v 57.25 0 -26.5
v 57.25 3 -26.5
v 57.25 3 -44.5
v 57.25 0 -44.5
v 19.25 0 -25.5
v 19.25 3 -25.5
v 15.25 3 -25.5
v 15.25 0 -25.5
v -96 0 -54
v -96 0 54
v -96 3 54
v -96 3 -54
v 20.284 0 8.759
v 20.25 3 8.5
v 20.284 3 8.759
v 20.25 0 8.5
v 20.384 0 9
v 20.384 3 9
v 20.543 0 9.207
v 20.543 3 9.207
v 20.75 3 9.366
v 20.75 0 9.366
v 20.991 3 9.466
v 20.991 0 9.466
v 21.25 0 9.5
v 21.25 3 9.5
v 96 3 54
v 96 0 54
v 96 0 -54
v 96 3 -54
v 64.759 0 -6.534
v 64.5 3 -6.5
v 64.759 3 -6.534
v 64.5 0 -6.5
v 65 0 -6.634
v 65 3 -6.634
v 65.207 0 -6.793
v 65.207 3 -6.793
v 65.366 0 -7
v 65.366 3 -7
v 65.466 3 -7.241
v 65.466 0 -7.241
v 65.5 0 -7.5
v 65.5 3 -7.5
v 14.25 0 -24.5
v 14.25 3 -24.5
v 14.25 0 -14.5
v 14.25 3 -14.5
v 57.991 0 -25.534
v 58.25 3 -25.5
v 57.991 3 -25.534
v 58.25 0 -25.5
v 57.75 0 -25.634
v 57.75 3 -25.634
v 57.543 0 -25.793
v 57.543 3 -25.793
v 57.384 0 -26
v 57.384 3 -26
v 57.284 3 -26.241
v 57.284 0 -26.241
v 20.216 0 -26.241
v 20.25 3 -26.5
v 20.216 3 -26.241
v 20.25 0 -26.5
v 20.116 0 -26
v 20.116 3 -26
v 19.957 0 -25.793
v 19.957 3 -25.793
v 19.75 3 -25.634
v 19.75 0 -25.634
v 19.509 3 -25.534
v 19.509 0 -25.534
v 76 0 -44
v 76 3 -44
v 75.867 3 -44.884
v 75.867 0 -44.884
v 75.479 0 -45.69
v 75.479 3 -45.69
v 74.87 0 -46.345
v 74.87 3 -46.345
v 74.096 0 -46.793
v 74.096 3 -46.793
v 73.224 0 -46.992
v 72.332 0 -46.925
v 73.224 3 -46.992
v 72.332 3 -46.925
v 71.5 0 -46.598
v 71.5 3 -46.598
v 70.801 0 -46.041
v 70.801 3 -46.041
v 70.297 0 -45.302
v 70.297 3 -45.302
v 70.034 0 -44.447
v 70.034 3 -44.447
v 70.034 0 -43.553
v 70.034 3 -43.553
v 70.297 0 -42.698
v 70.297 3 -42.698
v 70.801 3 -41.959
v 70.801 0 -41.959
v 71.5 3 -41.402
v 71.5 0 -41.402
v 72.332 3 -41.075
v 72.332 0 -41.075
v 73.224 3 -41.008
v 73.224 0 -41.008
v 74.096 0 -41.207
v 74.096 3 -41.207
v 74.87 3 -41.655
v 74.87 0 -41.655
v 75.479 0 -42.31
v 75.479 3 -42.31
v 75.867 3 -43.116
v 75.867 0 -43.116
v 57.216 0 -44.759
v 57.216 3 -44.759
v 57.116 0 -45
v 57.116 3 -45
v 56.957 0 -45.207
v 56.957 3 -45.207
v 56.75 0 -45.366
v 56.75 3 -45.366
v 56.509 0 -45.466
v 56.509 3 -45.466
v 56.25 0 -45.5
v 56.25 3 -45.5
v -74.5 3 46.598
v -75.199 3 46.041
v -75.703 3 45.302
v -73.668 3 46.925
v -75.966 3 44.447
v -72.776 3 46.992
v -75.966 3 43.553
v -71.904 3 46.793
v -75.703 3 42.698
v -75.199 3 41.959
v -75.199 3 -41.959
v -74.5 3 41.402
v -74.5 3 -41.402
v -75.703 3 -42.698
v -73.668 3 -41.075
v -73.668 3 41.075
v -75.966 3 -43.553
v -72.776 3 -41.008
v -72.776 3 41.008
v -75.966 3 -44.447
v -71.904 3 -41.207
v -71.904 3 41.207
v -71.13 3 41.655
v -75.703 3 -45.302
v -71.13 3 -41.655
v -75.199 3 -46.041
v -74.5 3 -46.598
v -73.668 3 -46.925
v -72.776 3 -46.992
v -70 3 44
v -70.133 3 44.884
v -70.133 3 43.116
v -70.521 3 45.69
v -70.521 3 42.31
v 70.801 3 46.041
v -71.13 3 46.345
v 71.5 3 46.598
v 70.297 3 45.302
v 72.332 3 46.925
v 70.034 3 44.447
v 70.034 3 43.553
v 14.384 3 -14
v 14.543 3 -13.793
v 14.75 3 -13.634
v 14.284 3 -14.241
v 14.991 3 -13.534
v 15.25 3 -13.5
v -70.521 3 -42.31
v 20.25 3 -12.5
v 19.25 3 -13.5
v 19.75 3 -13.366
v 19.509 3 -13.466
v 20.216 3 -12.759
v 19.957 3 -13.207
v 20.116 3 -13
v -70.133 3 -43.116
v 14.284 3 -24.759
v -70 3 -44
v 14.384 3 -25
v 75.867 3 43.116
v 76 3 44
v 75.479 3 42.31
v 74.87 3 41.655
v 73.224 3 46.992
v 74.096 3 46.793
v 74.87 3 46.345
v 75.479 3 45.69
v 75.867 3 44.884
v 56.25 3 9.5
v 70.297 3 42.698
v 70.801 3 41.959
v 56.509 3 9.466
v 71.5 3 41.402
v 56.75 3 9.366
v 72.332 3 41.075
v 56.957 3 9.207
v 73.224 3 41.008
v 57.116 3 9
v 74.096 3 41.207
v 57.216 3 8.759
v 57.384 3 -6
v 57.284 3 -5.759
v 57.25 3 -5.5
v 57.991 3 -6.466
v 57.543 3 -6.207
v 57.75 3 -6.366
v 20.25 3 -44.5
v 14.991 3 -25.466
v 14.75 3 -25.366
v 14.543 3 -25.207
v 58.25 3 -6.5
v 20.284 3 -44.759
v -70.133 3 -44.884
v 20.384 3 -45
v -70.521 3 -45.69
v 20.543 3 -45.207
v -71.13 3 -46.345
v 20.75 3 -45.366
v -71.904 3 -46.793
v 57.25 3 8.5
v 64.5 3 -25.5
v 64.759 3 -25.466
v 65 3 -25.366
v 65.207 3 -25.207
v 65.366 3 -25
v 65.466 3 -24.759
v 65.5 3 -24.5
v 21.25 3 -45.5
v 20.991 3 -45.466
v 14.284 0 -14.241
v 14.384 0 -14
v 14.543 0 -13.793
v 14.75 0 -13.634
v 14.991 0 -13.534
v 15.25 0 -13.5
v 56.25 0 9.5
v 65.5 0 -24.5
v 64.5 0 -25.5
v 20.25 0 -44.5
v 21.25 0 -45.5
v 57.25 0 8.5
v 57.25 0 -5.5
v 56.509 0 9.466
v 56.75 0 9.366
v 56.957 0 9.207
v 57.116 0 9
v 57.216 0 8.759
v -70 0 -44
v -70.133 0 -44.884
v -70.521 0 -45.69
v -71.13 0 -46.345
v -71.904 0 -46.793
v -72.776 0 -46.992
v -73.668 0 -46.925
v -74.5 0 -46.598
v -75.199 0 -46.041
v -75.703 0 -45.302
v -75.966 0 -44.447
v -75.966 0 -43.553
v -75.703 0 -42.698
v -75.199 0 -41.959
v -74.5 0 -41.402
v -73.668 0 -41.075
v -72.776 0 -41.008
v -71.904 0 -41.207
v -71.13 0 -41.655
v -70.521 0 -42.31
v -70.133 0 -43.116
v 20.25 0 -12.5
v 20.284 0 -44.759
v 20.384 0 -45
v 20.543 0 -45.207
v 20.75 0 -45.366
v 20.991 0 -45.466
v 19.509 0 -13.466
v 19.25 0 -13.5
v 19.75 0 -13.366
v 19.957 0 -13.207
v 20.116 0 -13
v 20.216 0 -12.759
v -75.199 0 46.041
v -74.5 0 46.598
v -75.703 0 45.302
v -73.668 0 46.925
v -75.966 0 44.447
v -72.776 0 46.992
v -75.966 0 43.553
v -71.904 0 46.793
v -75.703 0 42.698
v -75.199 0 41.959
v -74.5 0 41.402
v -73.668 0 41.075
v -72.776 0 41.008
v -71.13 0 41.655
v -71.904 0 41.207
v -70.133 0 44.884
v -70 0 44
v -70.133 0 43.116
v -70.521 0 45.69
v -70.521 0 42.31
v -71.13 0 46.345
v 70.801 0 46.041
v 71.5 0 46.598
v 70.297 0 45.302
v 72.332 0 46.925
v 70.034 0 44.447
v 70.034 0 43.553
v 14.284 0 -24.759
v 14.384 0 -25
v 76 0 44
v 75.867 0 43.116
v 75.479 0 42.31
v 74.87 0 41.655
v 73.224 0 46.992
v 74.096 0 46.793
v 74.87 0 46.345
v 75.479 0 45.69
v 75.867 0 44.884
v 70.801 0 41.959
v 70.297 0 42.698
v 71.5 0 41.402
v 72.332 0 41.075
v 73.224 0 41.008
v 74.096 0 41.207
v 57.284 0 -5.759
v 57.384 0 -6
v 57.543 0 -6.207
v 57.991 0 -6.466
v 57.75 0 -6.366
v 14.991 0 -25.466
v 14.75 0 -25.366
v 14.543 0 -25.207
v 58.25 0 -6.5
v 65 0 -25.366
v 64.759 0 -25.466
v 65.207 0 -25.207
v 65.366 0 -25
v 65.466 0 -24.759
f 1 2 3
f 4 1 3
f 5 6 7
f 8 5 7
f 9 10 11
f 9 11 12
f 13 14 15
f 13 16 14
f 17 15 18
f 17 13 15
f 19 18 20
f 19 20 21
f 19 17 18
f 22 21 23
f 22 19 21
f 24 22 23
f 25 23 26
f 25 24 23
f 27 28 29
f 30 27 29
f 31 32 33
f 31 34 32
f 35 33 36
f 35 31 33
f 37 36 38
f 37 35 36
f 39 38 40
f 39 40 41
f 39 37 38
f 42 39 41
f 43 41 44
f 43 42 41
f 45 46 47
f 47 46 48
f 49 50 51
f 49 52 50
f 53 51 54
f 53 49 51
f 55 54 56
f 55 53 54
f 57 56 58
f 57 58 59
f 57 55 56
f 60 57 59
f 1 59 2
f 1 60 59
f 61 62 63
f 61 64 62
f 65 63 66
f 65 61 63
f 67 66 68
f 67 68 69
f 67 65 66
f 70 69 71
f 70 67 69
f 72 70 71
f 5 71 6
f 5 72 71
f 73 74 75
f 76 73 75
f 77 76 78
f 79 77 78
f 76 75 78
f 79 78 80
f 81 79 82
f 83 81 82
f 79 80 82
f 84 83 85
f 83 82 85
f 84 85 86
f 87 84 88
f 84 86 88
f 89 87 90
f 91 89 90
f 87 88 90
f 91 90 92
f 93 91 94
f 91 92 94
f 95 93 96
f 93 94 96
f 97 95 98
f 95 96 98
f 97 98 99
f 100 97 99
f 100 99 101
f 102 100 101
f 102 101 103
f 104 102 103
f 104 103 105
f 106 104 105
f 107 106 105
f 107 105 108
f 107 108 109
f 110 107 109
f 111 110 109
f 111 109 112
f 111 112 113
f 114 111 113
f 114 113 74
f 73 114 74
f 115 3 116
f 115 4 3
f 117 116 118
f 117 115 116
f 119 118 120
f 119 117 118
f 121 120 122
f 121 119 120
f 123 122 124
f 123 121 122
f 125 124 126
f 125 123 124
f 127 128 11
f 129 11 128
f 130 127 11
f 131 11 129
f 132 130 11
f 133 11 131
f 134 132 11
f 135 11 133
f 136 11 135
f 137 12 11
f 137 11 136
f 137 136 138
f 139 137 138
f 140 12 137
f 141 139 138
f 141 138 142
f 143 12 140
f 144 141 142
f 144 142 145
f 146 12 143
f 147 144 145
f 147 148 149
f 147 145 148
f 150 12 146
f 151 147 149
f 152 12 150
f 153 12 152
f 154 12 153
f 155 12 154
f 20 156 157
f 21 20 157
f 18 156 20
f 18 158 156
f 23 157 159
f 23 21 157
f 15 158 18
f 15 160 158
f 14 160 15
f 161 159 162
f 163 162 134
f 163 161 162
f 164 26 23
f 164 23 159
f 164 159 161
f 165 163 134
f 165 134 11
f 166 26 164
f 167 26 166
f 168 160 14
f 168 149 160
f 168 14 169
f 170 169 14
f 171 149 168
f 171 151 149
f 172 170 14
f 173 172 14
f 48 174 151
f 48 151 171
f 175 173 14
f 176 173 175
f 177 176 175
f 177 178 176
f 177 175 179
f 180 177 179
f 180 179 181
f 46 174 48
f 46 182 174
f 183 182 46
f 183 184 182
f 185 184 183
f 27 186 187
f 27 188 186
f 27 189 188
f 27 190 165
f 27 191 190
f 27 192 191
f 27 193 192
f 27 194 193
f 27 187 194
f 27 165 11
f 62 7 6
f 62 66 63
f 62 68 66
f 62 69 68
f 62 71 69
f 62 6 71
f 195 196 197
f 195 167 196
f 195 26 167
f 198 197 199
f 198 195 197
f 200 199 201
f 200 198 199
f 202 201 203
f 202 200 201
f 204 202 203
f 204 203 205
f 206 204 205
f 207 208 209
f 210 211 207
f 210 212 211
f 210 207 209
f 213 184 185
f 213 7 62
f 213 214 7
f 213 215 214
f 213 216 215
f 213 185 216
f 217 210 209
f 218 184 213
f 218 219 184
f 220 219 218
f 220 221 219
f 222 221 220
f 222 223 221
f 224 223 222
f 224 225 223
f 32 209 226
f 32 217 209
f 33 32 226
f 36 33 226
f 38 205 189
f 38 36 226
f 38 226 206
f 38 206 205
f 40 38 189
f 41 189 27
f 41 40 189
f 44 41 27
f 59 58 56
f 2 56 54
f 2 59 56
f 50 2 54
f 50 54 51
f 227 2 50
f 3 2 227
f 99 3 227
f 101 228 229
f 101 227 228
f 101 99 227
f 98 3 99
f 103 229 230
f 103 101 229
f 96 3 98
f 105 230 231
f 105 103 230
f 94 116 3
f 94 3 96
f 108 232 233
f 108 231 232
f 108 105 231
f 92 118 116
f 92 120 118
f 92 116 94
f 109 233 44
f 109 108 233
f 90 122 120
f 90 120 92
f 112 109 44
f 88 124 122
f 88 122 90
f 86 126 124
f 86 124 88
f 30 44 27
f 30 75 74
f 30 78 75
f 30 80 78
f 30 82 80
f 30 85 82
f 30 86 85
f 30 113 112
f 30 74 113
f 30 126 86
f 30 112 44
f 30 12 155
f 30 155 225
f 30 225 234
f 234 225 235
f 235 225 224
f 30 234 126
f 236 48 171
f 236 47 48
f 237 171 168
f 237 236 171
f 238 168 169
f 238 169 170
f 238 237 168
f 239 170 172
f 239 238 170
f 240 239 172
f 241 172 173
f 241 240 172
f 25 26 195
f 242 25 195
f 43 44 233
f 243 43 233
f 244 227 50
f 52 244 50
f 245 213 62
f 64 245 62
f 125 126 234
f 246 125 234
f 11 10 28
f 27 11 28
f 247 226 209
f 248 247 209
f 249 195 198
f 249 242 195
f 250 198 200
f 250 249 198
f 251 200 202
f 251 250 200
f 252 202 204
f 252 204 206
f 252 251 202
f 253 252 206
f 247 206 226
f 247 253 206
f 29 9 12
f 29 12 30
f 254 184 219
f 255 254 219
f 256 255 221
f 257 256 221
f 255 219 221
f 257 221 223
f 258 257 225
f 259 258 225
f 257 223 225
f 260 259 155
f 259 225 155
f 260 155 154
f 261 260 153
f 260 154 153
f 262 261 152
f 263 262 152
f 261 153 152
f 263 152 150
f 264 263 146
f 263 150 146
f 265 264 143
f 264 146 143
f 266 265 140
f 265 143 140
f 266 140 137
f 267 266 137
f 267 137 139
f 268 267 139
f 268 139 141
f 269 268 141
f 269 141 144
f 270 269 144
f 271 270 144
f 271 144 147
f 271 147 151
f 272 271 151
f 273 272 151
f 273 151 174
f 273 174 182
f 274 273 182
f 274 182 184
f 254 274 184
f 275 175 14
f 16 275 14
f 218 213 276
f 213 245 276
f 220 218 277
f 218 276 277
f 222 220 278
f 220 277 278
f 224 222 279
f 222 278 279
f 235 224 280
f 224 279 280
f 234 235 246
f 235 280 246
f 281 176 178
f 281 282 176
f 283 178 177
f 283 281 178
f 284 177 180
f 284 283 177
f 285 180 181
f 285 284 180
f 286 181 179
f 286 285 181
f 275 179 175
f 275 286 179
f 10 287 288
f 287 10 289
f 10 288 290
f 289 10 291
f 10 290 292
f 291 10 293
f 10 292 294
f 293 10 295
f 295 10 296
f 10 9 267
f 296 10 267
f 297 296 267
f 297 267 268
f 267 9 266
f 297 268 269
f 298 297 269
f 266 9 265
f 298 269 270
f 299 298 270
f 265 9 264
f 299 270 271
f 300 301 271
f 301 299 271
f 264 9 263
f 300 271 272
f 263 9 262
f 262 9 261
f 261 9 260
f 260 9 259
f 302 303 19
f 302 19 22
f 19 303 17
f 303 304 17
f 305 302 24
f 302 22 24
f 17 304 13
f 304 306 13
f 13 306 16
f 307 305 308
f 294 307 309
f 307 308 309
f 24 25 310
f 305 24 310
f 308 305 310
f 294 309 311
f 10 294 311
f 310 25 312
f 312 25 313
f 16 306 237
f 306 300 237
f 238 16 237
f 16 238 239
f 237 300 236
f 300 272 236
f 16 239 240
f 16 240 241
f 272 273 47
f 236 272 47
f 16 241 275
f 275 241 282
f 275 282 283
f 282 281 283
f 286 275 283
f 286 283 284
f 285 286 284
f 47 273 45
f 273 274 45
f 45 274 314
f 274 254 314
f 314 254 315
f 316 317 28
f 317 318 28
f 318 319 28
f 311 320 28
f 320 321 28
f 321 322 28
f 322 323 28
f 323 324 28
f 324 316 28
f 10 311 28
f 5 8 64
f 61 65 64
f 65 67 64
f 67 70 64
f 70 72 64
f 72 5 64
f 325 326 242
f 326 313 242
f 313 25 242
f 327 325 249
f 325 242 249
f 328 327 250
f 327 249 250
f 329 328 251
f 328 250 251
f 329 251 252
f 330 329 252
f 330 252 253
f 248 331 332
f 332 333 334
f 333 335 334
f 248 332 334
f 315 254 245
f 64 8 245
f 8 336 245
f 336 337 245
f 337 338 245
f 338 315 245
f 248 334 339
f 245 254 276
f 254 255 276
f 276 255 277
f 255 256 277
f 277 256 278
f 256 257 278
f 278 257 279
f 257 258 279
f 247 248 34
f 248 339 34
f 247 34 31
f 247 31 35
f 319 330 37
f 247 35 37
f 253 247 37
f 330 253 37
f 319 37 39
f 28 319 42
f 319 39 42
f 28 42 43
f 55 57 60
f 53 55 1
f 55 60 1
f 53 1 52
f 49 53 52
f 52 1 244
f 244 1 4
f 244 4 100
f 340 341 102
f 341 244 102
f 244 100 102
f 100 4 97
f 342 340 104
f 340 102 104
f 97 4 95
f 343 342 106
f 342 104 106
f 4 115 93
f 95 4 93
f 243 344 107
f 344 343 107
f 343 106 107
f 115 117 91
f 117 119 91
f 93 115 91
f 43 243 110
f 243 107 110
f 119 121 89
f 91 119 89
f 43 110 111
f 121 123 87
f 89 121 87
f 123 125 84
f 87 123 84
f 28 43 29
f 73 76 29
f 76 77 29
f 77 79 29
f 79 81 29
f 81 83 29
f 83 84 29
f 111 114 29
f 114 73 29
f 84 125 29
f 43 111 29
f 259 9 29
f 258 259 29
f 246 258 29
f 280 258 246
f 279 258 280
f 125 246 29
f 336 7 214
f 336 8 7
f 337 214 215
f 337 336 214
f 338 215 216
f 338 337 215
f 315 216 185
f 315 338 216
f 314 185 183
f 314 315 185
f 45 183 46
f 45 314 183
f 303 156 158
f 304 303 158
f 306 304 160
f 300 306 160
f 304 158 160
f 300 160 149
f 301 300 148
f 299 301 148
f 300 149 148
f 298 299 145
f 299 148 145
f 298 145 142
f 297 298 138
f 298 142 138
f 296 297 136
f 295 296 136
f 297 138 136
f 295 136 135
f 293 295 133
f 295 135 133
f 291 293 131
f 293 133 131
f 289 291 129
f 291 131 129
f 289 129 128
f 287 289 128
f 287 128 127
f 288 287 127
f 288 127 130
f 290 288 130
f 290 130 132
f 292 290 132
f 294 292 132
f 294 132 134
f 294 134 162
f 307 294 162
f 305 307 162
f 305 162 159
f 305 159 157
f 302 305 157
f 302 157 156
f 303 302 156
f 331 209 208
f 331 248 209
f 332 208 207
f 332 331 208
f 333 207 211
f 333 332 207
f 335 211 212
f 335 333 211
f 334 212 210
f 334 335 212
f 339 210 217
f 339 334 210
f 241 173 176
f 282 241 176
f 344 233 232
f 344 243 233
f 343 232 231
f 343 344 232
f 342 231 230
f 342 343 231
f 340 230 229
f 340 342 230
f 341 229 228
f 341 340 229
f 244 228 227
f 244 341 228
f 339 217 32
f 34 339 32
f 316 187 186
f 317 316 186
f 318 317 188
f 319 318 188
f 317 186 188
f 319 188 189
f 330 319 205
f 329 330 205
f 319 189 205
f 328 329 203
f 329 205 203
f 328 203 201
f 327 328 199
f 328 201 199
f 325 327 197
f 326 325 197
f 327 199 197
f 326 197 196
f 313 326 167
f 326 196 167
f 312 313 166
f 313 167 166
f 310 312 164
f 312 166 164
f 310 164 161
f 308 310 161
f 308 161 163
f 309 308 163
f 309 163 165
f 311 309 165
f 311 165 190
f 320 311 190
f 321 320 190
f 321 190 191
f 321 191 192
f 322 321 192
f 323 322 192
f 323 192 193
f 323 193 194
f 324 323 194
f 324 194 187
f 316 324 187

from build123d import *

# Parameters (mm, degrees)
SKETCH_1_W          = 192
SKETCH_1_H          = 108
EXTRUDE_1_DEPTH     = 3
SKETCH_2_R          = 3
CUT_EXTRUDE_1_DEPTH = 4
FILLET_1_R          = 1


with BuildPart() as part:
    # Эскиз1 → Бобышка-Вытянуть1 (new body)
    with BuildSketch(Plane(origin=(0, 0, 0), x_dir=(1, 0, 0), z_dir=(0, 1, 0))):
        Rectangle(SKETCH_1_W, SKETCH_1_H)
    extrude(amount=EXTRUDE_1_DEPTH)

    # Эскиз2 → Вырез-Вытянуть1 (cut, through all)
    with BuildSketch(Plane(origin=(0, 3, 0), x_dir=(1, 0, 0), z_dir=(0, 1, 0))):
        with Locations((-73, 44)):
            Circle(SKETCH_2_R)
        with Locations((73, 44)):
            Circle(SKETCH_2_R)
        with Locations((-73, -44)):
            Circle(SKETCH_2_R)
        with Locations((73, -44)):
            Circle(SKETCH_2_R)
        Polygon((20.25, 45.5), (20.25, 25.5), (14.25, 25.5), (14.25, 13.5), (20.25, 13.5), (20.25, -9.5), (57.25, -9.5), (57.25, 6.5), (65.5, 6.5), (65.5, 25.5), (57.25, 25.5), (57.25, 45.5), align=None)
    extrude(amount=-CUT_EXTRUDE_1_DEPTH, mode=Mode.SUBTRACT)

    # Скругление1
    fillet_1_edges = [part.edges().sort_by_distance(p)[0] for p in [
        (20.25, 1.5, -45.5),
        (57.25, 1.5, -45.5),
        (57.25, 1.5, -25.5),
        (65.5, 1.5, -25.5),
        (65.5, 1.5, -6.5),
        (57.25, 1.5, -6.5),
        (57.25, 1.5, 9.5),
        (20.25, 1.5, 9.5),
        (20.25, 1.5, -13.5),
        (14.25, 1.5, -13.5),
        (14.25, 1.5, -25.5),
        (20.25, 1.5, -25.5),
    ]]
    fillet(fillet_1_edges, radius=FILLET_1_R)


solid = part.part
